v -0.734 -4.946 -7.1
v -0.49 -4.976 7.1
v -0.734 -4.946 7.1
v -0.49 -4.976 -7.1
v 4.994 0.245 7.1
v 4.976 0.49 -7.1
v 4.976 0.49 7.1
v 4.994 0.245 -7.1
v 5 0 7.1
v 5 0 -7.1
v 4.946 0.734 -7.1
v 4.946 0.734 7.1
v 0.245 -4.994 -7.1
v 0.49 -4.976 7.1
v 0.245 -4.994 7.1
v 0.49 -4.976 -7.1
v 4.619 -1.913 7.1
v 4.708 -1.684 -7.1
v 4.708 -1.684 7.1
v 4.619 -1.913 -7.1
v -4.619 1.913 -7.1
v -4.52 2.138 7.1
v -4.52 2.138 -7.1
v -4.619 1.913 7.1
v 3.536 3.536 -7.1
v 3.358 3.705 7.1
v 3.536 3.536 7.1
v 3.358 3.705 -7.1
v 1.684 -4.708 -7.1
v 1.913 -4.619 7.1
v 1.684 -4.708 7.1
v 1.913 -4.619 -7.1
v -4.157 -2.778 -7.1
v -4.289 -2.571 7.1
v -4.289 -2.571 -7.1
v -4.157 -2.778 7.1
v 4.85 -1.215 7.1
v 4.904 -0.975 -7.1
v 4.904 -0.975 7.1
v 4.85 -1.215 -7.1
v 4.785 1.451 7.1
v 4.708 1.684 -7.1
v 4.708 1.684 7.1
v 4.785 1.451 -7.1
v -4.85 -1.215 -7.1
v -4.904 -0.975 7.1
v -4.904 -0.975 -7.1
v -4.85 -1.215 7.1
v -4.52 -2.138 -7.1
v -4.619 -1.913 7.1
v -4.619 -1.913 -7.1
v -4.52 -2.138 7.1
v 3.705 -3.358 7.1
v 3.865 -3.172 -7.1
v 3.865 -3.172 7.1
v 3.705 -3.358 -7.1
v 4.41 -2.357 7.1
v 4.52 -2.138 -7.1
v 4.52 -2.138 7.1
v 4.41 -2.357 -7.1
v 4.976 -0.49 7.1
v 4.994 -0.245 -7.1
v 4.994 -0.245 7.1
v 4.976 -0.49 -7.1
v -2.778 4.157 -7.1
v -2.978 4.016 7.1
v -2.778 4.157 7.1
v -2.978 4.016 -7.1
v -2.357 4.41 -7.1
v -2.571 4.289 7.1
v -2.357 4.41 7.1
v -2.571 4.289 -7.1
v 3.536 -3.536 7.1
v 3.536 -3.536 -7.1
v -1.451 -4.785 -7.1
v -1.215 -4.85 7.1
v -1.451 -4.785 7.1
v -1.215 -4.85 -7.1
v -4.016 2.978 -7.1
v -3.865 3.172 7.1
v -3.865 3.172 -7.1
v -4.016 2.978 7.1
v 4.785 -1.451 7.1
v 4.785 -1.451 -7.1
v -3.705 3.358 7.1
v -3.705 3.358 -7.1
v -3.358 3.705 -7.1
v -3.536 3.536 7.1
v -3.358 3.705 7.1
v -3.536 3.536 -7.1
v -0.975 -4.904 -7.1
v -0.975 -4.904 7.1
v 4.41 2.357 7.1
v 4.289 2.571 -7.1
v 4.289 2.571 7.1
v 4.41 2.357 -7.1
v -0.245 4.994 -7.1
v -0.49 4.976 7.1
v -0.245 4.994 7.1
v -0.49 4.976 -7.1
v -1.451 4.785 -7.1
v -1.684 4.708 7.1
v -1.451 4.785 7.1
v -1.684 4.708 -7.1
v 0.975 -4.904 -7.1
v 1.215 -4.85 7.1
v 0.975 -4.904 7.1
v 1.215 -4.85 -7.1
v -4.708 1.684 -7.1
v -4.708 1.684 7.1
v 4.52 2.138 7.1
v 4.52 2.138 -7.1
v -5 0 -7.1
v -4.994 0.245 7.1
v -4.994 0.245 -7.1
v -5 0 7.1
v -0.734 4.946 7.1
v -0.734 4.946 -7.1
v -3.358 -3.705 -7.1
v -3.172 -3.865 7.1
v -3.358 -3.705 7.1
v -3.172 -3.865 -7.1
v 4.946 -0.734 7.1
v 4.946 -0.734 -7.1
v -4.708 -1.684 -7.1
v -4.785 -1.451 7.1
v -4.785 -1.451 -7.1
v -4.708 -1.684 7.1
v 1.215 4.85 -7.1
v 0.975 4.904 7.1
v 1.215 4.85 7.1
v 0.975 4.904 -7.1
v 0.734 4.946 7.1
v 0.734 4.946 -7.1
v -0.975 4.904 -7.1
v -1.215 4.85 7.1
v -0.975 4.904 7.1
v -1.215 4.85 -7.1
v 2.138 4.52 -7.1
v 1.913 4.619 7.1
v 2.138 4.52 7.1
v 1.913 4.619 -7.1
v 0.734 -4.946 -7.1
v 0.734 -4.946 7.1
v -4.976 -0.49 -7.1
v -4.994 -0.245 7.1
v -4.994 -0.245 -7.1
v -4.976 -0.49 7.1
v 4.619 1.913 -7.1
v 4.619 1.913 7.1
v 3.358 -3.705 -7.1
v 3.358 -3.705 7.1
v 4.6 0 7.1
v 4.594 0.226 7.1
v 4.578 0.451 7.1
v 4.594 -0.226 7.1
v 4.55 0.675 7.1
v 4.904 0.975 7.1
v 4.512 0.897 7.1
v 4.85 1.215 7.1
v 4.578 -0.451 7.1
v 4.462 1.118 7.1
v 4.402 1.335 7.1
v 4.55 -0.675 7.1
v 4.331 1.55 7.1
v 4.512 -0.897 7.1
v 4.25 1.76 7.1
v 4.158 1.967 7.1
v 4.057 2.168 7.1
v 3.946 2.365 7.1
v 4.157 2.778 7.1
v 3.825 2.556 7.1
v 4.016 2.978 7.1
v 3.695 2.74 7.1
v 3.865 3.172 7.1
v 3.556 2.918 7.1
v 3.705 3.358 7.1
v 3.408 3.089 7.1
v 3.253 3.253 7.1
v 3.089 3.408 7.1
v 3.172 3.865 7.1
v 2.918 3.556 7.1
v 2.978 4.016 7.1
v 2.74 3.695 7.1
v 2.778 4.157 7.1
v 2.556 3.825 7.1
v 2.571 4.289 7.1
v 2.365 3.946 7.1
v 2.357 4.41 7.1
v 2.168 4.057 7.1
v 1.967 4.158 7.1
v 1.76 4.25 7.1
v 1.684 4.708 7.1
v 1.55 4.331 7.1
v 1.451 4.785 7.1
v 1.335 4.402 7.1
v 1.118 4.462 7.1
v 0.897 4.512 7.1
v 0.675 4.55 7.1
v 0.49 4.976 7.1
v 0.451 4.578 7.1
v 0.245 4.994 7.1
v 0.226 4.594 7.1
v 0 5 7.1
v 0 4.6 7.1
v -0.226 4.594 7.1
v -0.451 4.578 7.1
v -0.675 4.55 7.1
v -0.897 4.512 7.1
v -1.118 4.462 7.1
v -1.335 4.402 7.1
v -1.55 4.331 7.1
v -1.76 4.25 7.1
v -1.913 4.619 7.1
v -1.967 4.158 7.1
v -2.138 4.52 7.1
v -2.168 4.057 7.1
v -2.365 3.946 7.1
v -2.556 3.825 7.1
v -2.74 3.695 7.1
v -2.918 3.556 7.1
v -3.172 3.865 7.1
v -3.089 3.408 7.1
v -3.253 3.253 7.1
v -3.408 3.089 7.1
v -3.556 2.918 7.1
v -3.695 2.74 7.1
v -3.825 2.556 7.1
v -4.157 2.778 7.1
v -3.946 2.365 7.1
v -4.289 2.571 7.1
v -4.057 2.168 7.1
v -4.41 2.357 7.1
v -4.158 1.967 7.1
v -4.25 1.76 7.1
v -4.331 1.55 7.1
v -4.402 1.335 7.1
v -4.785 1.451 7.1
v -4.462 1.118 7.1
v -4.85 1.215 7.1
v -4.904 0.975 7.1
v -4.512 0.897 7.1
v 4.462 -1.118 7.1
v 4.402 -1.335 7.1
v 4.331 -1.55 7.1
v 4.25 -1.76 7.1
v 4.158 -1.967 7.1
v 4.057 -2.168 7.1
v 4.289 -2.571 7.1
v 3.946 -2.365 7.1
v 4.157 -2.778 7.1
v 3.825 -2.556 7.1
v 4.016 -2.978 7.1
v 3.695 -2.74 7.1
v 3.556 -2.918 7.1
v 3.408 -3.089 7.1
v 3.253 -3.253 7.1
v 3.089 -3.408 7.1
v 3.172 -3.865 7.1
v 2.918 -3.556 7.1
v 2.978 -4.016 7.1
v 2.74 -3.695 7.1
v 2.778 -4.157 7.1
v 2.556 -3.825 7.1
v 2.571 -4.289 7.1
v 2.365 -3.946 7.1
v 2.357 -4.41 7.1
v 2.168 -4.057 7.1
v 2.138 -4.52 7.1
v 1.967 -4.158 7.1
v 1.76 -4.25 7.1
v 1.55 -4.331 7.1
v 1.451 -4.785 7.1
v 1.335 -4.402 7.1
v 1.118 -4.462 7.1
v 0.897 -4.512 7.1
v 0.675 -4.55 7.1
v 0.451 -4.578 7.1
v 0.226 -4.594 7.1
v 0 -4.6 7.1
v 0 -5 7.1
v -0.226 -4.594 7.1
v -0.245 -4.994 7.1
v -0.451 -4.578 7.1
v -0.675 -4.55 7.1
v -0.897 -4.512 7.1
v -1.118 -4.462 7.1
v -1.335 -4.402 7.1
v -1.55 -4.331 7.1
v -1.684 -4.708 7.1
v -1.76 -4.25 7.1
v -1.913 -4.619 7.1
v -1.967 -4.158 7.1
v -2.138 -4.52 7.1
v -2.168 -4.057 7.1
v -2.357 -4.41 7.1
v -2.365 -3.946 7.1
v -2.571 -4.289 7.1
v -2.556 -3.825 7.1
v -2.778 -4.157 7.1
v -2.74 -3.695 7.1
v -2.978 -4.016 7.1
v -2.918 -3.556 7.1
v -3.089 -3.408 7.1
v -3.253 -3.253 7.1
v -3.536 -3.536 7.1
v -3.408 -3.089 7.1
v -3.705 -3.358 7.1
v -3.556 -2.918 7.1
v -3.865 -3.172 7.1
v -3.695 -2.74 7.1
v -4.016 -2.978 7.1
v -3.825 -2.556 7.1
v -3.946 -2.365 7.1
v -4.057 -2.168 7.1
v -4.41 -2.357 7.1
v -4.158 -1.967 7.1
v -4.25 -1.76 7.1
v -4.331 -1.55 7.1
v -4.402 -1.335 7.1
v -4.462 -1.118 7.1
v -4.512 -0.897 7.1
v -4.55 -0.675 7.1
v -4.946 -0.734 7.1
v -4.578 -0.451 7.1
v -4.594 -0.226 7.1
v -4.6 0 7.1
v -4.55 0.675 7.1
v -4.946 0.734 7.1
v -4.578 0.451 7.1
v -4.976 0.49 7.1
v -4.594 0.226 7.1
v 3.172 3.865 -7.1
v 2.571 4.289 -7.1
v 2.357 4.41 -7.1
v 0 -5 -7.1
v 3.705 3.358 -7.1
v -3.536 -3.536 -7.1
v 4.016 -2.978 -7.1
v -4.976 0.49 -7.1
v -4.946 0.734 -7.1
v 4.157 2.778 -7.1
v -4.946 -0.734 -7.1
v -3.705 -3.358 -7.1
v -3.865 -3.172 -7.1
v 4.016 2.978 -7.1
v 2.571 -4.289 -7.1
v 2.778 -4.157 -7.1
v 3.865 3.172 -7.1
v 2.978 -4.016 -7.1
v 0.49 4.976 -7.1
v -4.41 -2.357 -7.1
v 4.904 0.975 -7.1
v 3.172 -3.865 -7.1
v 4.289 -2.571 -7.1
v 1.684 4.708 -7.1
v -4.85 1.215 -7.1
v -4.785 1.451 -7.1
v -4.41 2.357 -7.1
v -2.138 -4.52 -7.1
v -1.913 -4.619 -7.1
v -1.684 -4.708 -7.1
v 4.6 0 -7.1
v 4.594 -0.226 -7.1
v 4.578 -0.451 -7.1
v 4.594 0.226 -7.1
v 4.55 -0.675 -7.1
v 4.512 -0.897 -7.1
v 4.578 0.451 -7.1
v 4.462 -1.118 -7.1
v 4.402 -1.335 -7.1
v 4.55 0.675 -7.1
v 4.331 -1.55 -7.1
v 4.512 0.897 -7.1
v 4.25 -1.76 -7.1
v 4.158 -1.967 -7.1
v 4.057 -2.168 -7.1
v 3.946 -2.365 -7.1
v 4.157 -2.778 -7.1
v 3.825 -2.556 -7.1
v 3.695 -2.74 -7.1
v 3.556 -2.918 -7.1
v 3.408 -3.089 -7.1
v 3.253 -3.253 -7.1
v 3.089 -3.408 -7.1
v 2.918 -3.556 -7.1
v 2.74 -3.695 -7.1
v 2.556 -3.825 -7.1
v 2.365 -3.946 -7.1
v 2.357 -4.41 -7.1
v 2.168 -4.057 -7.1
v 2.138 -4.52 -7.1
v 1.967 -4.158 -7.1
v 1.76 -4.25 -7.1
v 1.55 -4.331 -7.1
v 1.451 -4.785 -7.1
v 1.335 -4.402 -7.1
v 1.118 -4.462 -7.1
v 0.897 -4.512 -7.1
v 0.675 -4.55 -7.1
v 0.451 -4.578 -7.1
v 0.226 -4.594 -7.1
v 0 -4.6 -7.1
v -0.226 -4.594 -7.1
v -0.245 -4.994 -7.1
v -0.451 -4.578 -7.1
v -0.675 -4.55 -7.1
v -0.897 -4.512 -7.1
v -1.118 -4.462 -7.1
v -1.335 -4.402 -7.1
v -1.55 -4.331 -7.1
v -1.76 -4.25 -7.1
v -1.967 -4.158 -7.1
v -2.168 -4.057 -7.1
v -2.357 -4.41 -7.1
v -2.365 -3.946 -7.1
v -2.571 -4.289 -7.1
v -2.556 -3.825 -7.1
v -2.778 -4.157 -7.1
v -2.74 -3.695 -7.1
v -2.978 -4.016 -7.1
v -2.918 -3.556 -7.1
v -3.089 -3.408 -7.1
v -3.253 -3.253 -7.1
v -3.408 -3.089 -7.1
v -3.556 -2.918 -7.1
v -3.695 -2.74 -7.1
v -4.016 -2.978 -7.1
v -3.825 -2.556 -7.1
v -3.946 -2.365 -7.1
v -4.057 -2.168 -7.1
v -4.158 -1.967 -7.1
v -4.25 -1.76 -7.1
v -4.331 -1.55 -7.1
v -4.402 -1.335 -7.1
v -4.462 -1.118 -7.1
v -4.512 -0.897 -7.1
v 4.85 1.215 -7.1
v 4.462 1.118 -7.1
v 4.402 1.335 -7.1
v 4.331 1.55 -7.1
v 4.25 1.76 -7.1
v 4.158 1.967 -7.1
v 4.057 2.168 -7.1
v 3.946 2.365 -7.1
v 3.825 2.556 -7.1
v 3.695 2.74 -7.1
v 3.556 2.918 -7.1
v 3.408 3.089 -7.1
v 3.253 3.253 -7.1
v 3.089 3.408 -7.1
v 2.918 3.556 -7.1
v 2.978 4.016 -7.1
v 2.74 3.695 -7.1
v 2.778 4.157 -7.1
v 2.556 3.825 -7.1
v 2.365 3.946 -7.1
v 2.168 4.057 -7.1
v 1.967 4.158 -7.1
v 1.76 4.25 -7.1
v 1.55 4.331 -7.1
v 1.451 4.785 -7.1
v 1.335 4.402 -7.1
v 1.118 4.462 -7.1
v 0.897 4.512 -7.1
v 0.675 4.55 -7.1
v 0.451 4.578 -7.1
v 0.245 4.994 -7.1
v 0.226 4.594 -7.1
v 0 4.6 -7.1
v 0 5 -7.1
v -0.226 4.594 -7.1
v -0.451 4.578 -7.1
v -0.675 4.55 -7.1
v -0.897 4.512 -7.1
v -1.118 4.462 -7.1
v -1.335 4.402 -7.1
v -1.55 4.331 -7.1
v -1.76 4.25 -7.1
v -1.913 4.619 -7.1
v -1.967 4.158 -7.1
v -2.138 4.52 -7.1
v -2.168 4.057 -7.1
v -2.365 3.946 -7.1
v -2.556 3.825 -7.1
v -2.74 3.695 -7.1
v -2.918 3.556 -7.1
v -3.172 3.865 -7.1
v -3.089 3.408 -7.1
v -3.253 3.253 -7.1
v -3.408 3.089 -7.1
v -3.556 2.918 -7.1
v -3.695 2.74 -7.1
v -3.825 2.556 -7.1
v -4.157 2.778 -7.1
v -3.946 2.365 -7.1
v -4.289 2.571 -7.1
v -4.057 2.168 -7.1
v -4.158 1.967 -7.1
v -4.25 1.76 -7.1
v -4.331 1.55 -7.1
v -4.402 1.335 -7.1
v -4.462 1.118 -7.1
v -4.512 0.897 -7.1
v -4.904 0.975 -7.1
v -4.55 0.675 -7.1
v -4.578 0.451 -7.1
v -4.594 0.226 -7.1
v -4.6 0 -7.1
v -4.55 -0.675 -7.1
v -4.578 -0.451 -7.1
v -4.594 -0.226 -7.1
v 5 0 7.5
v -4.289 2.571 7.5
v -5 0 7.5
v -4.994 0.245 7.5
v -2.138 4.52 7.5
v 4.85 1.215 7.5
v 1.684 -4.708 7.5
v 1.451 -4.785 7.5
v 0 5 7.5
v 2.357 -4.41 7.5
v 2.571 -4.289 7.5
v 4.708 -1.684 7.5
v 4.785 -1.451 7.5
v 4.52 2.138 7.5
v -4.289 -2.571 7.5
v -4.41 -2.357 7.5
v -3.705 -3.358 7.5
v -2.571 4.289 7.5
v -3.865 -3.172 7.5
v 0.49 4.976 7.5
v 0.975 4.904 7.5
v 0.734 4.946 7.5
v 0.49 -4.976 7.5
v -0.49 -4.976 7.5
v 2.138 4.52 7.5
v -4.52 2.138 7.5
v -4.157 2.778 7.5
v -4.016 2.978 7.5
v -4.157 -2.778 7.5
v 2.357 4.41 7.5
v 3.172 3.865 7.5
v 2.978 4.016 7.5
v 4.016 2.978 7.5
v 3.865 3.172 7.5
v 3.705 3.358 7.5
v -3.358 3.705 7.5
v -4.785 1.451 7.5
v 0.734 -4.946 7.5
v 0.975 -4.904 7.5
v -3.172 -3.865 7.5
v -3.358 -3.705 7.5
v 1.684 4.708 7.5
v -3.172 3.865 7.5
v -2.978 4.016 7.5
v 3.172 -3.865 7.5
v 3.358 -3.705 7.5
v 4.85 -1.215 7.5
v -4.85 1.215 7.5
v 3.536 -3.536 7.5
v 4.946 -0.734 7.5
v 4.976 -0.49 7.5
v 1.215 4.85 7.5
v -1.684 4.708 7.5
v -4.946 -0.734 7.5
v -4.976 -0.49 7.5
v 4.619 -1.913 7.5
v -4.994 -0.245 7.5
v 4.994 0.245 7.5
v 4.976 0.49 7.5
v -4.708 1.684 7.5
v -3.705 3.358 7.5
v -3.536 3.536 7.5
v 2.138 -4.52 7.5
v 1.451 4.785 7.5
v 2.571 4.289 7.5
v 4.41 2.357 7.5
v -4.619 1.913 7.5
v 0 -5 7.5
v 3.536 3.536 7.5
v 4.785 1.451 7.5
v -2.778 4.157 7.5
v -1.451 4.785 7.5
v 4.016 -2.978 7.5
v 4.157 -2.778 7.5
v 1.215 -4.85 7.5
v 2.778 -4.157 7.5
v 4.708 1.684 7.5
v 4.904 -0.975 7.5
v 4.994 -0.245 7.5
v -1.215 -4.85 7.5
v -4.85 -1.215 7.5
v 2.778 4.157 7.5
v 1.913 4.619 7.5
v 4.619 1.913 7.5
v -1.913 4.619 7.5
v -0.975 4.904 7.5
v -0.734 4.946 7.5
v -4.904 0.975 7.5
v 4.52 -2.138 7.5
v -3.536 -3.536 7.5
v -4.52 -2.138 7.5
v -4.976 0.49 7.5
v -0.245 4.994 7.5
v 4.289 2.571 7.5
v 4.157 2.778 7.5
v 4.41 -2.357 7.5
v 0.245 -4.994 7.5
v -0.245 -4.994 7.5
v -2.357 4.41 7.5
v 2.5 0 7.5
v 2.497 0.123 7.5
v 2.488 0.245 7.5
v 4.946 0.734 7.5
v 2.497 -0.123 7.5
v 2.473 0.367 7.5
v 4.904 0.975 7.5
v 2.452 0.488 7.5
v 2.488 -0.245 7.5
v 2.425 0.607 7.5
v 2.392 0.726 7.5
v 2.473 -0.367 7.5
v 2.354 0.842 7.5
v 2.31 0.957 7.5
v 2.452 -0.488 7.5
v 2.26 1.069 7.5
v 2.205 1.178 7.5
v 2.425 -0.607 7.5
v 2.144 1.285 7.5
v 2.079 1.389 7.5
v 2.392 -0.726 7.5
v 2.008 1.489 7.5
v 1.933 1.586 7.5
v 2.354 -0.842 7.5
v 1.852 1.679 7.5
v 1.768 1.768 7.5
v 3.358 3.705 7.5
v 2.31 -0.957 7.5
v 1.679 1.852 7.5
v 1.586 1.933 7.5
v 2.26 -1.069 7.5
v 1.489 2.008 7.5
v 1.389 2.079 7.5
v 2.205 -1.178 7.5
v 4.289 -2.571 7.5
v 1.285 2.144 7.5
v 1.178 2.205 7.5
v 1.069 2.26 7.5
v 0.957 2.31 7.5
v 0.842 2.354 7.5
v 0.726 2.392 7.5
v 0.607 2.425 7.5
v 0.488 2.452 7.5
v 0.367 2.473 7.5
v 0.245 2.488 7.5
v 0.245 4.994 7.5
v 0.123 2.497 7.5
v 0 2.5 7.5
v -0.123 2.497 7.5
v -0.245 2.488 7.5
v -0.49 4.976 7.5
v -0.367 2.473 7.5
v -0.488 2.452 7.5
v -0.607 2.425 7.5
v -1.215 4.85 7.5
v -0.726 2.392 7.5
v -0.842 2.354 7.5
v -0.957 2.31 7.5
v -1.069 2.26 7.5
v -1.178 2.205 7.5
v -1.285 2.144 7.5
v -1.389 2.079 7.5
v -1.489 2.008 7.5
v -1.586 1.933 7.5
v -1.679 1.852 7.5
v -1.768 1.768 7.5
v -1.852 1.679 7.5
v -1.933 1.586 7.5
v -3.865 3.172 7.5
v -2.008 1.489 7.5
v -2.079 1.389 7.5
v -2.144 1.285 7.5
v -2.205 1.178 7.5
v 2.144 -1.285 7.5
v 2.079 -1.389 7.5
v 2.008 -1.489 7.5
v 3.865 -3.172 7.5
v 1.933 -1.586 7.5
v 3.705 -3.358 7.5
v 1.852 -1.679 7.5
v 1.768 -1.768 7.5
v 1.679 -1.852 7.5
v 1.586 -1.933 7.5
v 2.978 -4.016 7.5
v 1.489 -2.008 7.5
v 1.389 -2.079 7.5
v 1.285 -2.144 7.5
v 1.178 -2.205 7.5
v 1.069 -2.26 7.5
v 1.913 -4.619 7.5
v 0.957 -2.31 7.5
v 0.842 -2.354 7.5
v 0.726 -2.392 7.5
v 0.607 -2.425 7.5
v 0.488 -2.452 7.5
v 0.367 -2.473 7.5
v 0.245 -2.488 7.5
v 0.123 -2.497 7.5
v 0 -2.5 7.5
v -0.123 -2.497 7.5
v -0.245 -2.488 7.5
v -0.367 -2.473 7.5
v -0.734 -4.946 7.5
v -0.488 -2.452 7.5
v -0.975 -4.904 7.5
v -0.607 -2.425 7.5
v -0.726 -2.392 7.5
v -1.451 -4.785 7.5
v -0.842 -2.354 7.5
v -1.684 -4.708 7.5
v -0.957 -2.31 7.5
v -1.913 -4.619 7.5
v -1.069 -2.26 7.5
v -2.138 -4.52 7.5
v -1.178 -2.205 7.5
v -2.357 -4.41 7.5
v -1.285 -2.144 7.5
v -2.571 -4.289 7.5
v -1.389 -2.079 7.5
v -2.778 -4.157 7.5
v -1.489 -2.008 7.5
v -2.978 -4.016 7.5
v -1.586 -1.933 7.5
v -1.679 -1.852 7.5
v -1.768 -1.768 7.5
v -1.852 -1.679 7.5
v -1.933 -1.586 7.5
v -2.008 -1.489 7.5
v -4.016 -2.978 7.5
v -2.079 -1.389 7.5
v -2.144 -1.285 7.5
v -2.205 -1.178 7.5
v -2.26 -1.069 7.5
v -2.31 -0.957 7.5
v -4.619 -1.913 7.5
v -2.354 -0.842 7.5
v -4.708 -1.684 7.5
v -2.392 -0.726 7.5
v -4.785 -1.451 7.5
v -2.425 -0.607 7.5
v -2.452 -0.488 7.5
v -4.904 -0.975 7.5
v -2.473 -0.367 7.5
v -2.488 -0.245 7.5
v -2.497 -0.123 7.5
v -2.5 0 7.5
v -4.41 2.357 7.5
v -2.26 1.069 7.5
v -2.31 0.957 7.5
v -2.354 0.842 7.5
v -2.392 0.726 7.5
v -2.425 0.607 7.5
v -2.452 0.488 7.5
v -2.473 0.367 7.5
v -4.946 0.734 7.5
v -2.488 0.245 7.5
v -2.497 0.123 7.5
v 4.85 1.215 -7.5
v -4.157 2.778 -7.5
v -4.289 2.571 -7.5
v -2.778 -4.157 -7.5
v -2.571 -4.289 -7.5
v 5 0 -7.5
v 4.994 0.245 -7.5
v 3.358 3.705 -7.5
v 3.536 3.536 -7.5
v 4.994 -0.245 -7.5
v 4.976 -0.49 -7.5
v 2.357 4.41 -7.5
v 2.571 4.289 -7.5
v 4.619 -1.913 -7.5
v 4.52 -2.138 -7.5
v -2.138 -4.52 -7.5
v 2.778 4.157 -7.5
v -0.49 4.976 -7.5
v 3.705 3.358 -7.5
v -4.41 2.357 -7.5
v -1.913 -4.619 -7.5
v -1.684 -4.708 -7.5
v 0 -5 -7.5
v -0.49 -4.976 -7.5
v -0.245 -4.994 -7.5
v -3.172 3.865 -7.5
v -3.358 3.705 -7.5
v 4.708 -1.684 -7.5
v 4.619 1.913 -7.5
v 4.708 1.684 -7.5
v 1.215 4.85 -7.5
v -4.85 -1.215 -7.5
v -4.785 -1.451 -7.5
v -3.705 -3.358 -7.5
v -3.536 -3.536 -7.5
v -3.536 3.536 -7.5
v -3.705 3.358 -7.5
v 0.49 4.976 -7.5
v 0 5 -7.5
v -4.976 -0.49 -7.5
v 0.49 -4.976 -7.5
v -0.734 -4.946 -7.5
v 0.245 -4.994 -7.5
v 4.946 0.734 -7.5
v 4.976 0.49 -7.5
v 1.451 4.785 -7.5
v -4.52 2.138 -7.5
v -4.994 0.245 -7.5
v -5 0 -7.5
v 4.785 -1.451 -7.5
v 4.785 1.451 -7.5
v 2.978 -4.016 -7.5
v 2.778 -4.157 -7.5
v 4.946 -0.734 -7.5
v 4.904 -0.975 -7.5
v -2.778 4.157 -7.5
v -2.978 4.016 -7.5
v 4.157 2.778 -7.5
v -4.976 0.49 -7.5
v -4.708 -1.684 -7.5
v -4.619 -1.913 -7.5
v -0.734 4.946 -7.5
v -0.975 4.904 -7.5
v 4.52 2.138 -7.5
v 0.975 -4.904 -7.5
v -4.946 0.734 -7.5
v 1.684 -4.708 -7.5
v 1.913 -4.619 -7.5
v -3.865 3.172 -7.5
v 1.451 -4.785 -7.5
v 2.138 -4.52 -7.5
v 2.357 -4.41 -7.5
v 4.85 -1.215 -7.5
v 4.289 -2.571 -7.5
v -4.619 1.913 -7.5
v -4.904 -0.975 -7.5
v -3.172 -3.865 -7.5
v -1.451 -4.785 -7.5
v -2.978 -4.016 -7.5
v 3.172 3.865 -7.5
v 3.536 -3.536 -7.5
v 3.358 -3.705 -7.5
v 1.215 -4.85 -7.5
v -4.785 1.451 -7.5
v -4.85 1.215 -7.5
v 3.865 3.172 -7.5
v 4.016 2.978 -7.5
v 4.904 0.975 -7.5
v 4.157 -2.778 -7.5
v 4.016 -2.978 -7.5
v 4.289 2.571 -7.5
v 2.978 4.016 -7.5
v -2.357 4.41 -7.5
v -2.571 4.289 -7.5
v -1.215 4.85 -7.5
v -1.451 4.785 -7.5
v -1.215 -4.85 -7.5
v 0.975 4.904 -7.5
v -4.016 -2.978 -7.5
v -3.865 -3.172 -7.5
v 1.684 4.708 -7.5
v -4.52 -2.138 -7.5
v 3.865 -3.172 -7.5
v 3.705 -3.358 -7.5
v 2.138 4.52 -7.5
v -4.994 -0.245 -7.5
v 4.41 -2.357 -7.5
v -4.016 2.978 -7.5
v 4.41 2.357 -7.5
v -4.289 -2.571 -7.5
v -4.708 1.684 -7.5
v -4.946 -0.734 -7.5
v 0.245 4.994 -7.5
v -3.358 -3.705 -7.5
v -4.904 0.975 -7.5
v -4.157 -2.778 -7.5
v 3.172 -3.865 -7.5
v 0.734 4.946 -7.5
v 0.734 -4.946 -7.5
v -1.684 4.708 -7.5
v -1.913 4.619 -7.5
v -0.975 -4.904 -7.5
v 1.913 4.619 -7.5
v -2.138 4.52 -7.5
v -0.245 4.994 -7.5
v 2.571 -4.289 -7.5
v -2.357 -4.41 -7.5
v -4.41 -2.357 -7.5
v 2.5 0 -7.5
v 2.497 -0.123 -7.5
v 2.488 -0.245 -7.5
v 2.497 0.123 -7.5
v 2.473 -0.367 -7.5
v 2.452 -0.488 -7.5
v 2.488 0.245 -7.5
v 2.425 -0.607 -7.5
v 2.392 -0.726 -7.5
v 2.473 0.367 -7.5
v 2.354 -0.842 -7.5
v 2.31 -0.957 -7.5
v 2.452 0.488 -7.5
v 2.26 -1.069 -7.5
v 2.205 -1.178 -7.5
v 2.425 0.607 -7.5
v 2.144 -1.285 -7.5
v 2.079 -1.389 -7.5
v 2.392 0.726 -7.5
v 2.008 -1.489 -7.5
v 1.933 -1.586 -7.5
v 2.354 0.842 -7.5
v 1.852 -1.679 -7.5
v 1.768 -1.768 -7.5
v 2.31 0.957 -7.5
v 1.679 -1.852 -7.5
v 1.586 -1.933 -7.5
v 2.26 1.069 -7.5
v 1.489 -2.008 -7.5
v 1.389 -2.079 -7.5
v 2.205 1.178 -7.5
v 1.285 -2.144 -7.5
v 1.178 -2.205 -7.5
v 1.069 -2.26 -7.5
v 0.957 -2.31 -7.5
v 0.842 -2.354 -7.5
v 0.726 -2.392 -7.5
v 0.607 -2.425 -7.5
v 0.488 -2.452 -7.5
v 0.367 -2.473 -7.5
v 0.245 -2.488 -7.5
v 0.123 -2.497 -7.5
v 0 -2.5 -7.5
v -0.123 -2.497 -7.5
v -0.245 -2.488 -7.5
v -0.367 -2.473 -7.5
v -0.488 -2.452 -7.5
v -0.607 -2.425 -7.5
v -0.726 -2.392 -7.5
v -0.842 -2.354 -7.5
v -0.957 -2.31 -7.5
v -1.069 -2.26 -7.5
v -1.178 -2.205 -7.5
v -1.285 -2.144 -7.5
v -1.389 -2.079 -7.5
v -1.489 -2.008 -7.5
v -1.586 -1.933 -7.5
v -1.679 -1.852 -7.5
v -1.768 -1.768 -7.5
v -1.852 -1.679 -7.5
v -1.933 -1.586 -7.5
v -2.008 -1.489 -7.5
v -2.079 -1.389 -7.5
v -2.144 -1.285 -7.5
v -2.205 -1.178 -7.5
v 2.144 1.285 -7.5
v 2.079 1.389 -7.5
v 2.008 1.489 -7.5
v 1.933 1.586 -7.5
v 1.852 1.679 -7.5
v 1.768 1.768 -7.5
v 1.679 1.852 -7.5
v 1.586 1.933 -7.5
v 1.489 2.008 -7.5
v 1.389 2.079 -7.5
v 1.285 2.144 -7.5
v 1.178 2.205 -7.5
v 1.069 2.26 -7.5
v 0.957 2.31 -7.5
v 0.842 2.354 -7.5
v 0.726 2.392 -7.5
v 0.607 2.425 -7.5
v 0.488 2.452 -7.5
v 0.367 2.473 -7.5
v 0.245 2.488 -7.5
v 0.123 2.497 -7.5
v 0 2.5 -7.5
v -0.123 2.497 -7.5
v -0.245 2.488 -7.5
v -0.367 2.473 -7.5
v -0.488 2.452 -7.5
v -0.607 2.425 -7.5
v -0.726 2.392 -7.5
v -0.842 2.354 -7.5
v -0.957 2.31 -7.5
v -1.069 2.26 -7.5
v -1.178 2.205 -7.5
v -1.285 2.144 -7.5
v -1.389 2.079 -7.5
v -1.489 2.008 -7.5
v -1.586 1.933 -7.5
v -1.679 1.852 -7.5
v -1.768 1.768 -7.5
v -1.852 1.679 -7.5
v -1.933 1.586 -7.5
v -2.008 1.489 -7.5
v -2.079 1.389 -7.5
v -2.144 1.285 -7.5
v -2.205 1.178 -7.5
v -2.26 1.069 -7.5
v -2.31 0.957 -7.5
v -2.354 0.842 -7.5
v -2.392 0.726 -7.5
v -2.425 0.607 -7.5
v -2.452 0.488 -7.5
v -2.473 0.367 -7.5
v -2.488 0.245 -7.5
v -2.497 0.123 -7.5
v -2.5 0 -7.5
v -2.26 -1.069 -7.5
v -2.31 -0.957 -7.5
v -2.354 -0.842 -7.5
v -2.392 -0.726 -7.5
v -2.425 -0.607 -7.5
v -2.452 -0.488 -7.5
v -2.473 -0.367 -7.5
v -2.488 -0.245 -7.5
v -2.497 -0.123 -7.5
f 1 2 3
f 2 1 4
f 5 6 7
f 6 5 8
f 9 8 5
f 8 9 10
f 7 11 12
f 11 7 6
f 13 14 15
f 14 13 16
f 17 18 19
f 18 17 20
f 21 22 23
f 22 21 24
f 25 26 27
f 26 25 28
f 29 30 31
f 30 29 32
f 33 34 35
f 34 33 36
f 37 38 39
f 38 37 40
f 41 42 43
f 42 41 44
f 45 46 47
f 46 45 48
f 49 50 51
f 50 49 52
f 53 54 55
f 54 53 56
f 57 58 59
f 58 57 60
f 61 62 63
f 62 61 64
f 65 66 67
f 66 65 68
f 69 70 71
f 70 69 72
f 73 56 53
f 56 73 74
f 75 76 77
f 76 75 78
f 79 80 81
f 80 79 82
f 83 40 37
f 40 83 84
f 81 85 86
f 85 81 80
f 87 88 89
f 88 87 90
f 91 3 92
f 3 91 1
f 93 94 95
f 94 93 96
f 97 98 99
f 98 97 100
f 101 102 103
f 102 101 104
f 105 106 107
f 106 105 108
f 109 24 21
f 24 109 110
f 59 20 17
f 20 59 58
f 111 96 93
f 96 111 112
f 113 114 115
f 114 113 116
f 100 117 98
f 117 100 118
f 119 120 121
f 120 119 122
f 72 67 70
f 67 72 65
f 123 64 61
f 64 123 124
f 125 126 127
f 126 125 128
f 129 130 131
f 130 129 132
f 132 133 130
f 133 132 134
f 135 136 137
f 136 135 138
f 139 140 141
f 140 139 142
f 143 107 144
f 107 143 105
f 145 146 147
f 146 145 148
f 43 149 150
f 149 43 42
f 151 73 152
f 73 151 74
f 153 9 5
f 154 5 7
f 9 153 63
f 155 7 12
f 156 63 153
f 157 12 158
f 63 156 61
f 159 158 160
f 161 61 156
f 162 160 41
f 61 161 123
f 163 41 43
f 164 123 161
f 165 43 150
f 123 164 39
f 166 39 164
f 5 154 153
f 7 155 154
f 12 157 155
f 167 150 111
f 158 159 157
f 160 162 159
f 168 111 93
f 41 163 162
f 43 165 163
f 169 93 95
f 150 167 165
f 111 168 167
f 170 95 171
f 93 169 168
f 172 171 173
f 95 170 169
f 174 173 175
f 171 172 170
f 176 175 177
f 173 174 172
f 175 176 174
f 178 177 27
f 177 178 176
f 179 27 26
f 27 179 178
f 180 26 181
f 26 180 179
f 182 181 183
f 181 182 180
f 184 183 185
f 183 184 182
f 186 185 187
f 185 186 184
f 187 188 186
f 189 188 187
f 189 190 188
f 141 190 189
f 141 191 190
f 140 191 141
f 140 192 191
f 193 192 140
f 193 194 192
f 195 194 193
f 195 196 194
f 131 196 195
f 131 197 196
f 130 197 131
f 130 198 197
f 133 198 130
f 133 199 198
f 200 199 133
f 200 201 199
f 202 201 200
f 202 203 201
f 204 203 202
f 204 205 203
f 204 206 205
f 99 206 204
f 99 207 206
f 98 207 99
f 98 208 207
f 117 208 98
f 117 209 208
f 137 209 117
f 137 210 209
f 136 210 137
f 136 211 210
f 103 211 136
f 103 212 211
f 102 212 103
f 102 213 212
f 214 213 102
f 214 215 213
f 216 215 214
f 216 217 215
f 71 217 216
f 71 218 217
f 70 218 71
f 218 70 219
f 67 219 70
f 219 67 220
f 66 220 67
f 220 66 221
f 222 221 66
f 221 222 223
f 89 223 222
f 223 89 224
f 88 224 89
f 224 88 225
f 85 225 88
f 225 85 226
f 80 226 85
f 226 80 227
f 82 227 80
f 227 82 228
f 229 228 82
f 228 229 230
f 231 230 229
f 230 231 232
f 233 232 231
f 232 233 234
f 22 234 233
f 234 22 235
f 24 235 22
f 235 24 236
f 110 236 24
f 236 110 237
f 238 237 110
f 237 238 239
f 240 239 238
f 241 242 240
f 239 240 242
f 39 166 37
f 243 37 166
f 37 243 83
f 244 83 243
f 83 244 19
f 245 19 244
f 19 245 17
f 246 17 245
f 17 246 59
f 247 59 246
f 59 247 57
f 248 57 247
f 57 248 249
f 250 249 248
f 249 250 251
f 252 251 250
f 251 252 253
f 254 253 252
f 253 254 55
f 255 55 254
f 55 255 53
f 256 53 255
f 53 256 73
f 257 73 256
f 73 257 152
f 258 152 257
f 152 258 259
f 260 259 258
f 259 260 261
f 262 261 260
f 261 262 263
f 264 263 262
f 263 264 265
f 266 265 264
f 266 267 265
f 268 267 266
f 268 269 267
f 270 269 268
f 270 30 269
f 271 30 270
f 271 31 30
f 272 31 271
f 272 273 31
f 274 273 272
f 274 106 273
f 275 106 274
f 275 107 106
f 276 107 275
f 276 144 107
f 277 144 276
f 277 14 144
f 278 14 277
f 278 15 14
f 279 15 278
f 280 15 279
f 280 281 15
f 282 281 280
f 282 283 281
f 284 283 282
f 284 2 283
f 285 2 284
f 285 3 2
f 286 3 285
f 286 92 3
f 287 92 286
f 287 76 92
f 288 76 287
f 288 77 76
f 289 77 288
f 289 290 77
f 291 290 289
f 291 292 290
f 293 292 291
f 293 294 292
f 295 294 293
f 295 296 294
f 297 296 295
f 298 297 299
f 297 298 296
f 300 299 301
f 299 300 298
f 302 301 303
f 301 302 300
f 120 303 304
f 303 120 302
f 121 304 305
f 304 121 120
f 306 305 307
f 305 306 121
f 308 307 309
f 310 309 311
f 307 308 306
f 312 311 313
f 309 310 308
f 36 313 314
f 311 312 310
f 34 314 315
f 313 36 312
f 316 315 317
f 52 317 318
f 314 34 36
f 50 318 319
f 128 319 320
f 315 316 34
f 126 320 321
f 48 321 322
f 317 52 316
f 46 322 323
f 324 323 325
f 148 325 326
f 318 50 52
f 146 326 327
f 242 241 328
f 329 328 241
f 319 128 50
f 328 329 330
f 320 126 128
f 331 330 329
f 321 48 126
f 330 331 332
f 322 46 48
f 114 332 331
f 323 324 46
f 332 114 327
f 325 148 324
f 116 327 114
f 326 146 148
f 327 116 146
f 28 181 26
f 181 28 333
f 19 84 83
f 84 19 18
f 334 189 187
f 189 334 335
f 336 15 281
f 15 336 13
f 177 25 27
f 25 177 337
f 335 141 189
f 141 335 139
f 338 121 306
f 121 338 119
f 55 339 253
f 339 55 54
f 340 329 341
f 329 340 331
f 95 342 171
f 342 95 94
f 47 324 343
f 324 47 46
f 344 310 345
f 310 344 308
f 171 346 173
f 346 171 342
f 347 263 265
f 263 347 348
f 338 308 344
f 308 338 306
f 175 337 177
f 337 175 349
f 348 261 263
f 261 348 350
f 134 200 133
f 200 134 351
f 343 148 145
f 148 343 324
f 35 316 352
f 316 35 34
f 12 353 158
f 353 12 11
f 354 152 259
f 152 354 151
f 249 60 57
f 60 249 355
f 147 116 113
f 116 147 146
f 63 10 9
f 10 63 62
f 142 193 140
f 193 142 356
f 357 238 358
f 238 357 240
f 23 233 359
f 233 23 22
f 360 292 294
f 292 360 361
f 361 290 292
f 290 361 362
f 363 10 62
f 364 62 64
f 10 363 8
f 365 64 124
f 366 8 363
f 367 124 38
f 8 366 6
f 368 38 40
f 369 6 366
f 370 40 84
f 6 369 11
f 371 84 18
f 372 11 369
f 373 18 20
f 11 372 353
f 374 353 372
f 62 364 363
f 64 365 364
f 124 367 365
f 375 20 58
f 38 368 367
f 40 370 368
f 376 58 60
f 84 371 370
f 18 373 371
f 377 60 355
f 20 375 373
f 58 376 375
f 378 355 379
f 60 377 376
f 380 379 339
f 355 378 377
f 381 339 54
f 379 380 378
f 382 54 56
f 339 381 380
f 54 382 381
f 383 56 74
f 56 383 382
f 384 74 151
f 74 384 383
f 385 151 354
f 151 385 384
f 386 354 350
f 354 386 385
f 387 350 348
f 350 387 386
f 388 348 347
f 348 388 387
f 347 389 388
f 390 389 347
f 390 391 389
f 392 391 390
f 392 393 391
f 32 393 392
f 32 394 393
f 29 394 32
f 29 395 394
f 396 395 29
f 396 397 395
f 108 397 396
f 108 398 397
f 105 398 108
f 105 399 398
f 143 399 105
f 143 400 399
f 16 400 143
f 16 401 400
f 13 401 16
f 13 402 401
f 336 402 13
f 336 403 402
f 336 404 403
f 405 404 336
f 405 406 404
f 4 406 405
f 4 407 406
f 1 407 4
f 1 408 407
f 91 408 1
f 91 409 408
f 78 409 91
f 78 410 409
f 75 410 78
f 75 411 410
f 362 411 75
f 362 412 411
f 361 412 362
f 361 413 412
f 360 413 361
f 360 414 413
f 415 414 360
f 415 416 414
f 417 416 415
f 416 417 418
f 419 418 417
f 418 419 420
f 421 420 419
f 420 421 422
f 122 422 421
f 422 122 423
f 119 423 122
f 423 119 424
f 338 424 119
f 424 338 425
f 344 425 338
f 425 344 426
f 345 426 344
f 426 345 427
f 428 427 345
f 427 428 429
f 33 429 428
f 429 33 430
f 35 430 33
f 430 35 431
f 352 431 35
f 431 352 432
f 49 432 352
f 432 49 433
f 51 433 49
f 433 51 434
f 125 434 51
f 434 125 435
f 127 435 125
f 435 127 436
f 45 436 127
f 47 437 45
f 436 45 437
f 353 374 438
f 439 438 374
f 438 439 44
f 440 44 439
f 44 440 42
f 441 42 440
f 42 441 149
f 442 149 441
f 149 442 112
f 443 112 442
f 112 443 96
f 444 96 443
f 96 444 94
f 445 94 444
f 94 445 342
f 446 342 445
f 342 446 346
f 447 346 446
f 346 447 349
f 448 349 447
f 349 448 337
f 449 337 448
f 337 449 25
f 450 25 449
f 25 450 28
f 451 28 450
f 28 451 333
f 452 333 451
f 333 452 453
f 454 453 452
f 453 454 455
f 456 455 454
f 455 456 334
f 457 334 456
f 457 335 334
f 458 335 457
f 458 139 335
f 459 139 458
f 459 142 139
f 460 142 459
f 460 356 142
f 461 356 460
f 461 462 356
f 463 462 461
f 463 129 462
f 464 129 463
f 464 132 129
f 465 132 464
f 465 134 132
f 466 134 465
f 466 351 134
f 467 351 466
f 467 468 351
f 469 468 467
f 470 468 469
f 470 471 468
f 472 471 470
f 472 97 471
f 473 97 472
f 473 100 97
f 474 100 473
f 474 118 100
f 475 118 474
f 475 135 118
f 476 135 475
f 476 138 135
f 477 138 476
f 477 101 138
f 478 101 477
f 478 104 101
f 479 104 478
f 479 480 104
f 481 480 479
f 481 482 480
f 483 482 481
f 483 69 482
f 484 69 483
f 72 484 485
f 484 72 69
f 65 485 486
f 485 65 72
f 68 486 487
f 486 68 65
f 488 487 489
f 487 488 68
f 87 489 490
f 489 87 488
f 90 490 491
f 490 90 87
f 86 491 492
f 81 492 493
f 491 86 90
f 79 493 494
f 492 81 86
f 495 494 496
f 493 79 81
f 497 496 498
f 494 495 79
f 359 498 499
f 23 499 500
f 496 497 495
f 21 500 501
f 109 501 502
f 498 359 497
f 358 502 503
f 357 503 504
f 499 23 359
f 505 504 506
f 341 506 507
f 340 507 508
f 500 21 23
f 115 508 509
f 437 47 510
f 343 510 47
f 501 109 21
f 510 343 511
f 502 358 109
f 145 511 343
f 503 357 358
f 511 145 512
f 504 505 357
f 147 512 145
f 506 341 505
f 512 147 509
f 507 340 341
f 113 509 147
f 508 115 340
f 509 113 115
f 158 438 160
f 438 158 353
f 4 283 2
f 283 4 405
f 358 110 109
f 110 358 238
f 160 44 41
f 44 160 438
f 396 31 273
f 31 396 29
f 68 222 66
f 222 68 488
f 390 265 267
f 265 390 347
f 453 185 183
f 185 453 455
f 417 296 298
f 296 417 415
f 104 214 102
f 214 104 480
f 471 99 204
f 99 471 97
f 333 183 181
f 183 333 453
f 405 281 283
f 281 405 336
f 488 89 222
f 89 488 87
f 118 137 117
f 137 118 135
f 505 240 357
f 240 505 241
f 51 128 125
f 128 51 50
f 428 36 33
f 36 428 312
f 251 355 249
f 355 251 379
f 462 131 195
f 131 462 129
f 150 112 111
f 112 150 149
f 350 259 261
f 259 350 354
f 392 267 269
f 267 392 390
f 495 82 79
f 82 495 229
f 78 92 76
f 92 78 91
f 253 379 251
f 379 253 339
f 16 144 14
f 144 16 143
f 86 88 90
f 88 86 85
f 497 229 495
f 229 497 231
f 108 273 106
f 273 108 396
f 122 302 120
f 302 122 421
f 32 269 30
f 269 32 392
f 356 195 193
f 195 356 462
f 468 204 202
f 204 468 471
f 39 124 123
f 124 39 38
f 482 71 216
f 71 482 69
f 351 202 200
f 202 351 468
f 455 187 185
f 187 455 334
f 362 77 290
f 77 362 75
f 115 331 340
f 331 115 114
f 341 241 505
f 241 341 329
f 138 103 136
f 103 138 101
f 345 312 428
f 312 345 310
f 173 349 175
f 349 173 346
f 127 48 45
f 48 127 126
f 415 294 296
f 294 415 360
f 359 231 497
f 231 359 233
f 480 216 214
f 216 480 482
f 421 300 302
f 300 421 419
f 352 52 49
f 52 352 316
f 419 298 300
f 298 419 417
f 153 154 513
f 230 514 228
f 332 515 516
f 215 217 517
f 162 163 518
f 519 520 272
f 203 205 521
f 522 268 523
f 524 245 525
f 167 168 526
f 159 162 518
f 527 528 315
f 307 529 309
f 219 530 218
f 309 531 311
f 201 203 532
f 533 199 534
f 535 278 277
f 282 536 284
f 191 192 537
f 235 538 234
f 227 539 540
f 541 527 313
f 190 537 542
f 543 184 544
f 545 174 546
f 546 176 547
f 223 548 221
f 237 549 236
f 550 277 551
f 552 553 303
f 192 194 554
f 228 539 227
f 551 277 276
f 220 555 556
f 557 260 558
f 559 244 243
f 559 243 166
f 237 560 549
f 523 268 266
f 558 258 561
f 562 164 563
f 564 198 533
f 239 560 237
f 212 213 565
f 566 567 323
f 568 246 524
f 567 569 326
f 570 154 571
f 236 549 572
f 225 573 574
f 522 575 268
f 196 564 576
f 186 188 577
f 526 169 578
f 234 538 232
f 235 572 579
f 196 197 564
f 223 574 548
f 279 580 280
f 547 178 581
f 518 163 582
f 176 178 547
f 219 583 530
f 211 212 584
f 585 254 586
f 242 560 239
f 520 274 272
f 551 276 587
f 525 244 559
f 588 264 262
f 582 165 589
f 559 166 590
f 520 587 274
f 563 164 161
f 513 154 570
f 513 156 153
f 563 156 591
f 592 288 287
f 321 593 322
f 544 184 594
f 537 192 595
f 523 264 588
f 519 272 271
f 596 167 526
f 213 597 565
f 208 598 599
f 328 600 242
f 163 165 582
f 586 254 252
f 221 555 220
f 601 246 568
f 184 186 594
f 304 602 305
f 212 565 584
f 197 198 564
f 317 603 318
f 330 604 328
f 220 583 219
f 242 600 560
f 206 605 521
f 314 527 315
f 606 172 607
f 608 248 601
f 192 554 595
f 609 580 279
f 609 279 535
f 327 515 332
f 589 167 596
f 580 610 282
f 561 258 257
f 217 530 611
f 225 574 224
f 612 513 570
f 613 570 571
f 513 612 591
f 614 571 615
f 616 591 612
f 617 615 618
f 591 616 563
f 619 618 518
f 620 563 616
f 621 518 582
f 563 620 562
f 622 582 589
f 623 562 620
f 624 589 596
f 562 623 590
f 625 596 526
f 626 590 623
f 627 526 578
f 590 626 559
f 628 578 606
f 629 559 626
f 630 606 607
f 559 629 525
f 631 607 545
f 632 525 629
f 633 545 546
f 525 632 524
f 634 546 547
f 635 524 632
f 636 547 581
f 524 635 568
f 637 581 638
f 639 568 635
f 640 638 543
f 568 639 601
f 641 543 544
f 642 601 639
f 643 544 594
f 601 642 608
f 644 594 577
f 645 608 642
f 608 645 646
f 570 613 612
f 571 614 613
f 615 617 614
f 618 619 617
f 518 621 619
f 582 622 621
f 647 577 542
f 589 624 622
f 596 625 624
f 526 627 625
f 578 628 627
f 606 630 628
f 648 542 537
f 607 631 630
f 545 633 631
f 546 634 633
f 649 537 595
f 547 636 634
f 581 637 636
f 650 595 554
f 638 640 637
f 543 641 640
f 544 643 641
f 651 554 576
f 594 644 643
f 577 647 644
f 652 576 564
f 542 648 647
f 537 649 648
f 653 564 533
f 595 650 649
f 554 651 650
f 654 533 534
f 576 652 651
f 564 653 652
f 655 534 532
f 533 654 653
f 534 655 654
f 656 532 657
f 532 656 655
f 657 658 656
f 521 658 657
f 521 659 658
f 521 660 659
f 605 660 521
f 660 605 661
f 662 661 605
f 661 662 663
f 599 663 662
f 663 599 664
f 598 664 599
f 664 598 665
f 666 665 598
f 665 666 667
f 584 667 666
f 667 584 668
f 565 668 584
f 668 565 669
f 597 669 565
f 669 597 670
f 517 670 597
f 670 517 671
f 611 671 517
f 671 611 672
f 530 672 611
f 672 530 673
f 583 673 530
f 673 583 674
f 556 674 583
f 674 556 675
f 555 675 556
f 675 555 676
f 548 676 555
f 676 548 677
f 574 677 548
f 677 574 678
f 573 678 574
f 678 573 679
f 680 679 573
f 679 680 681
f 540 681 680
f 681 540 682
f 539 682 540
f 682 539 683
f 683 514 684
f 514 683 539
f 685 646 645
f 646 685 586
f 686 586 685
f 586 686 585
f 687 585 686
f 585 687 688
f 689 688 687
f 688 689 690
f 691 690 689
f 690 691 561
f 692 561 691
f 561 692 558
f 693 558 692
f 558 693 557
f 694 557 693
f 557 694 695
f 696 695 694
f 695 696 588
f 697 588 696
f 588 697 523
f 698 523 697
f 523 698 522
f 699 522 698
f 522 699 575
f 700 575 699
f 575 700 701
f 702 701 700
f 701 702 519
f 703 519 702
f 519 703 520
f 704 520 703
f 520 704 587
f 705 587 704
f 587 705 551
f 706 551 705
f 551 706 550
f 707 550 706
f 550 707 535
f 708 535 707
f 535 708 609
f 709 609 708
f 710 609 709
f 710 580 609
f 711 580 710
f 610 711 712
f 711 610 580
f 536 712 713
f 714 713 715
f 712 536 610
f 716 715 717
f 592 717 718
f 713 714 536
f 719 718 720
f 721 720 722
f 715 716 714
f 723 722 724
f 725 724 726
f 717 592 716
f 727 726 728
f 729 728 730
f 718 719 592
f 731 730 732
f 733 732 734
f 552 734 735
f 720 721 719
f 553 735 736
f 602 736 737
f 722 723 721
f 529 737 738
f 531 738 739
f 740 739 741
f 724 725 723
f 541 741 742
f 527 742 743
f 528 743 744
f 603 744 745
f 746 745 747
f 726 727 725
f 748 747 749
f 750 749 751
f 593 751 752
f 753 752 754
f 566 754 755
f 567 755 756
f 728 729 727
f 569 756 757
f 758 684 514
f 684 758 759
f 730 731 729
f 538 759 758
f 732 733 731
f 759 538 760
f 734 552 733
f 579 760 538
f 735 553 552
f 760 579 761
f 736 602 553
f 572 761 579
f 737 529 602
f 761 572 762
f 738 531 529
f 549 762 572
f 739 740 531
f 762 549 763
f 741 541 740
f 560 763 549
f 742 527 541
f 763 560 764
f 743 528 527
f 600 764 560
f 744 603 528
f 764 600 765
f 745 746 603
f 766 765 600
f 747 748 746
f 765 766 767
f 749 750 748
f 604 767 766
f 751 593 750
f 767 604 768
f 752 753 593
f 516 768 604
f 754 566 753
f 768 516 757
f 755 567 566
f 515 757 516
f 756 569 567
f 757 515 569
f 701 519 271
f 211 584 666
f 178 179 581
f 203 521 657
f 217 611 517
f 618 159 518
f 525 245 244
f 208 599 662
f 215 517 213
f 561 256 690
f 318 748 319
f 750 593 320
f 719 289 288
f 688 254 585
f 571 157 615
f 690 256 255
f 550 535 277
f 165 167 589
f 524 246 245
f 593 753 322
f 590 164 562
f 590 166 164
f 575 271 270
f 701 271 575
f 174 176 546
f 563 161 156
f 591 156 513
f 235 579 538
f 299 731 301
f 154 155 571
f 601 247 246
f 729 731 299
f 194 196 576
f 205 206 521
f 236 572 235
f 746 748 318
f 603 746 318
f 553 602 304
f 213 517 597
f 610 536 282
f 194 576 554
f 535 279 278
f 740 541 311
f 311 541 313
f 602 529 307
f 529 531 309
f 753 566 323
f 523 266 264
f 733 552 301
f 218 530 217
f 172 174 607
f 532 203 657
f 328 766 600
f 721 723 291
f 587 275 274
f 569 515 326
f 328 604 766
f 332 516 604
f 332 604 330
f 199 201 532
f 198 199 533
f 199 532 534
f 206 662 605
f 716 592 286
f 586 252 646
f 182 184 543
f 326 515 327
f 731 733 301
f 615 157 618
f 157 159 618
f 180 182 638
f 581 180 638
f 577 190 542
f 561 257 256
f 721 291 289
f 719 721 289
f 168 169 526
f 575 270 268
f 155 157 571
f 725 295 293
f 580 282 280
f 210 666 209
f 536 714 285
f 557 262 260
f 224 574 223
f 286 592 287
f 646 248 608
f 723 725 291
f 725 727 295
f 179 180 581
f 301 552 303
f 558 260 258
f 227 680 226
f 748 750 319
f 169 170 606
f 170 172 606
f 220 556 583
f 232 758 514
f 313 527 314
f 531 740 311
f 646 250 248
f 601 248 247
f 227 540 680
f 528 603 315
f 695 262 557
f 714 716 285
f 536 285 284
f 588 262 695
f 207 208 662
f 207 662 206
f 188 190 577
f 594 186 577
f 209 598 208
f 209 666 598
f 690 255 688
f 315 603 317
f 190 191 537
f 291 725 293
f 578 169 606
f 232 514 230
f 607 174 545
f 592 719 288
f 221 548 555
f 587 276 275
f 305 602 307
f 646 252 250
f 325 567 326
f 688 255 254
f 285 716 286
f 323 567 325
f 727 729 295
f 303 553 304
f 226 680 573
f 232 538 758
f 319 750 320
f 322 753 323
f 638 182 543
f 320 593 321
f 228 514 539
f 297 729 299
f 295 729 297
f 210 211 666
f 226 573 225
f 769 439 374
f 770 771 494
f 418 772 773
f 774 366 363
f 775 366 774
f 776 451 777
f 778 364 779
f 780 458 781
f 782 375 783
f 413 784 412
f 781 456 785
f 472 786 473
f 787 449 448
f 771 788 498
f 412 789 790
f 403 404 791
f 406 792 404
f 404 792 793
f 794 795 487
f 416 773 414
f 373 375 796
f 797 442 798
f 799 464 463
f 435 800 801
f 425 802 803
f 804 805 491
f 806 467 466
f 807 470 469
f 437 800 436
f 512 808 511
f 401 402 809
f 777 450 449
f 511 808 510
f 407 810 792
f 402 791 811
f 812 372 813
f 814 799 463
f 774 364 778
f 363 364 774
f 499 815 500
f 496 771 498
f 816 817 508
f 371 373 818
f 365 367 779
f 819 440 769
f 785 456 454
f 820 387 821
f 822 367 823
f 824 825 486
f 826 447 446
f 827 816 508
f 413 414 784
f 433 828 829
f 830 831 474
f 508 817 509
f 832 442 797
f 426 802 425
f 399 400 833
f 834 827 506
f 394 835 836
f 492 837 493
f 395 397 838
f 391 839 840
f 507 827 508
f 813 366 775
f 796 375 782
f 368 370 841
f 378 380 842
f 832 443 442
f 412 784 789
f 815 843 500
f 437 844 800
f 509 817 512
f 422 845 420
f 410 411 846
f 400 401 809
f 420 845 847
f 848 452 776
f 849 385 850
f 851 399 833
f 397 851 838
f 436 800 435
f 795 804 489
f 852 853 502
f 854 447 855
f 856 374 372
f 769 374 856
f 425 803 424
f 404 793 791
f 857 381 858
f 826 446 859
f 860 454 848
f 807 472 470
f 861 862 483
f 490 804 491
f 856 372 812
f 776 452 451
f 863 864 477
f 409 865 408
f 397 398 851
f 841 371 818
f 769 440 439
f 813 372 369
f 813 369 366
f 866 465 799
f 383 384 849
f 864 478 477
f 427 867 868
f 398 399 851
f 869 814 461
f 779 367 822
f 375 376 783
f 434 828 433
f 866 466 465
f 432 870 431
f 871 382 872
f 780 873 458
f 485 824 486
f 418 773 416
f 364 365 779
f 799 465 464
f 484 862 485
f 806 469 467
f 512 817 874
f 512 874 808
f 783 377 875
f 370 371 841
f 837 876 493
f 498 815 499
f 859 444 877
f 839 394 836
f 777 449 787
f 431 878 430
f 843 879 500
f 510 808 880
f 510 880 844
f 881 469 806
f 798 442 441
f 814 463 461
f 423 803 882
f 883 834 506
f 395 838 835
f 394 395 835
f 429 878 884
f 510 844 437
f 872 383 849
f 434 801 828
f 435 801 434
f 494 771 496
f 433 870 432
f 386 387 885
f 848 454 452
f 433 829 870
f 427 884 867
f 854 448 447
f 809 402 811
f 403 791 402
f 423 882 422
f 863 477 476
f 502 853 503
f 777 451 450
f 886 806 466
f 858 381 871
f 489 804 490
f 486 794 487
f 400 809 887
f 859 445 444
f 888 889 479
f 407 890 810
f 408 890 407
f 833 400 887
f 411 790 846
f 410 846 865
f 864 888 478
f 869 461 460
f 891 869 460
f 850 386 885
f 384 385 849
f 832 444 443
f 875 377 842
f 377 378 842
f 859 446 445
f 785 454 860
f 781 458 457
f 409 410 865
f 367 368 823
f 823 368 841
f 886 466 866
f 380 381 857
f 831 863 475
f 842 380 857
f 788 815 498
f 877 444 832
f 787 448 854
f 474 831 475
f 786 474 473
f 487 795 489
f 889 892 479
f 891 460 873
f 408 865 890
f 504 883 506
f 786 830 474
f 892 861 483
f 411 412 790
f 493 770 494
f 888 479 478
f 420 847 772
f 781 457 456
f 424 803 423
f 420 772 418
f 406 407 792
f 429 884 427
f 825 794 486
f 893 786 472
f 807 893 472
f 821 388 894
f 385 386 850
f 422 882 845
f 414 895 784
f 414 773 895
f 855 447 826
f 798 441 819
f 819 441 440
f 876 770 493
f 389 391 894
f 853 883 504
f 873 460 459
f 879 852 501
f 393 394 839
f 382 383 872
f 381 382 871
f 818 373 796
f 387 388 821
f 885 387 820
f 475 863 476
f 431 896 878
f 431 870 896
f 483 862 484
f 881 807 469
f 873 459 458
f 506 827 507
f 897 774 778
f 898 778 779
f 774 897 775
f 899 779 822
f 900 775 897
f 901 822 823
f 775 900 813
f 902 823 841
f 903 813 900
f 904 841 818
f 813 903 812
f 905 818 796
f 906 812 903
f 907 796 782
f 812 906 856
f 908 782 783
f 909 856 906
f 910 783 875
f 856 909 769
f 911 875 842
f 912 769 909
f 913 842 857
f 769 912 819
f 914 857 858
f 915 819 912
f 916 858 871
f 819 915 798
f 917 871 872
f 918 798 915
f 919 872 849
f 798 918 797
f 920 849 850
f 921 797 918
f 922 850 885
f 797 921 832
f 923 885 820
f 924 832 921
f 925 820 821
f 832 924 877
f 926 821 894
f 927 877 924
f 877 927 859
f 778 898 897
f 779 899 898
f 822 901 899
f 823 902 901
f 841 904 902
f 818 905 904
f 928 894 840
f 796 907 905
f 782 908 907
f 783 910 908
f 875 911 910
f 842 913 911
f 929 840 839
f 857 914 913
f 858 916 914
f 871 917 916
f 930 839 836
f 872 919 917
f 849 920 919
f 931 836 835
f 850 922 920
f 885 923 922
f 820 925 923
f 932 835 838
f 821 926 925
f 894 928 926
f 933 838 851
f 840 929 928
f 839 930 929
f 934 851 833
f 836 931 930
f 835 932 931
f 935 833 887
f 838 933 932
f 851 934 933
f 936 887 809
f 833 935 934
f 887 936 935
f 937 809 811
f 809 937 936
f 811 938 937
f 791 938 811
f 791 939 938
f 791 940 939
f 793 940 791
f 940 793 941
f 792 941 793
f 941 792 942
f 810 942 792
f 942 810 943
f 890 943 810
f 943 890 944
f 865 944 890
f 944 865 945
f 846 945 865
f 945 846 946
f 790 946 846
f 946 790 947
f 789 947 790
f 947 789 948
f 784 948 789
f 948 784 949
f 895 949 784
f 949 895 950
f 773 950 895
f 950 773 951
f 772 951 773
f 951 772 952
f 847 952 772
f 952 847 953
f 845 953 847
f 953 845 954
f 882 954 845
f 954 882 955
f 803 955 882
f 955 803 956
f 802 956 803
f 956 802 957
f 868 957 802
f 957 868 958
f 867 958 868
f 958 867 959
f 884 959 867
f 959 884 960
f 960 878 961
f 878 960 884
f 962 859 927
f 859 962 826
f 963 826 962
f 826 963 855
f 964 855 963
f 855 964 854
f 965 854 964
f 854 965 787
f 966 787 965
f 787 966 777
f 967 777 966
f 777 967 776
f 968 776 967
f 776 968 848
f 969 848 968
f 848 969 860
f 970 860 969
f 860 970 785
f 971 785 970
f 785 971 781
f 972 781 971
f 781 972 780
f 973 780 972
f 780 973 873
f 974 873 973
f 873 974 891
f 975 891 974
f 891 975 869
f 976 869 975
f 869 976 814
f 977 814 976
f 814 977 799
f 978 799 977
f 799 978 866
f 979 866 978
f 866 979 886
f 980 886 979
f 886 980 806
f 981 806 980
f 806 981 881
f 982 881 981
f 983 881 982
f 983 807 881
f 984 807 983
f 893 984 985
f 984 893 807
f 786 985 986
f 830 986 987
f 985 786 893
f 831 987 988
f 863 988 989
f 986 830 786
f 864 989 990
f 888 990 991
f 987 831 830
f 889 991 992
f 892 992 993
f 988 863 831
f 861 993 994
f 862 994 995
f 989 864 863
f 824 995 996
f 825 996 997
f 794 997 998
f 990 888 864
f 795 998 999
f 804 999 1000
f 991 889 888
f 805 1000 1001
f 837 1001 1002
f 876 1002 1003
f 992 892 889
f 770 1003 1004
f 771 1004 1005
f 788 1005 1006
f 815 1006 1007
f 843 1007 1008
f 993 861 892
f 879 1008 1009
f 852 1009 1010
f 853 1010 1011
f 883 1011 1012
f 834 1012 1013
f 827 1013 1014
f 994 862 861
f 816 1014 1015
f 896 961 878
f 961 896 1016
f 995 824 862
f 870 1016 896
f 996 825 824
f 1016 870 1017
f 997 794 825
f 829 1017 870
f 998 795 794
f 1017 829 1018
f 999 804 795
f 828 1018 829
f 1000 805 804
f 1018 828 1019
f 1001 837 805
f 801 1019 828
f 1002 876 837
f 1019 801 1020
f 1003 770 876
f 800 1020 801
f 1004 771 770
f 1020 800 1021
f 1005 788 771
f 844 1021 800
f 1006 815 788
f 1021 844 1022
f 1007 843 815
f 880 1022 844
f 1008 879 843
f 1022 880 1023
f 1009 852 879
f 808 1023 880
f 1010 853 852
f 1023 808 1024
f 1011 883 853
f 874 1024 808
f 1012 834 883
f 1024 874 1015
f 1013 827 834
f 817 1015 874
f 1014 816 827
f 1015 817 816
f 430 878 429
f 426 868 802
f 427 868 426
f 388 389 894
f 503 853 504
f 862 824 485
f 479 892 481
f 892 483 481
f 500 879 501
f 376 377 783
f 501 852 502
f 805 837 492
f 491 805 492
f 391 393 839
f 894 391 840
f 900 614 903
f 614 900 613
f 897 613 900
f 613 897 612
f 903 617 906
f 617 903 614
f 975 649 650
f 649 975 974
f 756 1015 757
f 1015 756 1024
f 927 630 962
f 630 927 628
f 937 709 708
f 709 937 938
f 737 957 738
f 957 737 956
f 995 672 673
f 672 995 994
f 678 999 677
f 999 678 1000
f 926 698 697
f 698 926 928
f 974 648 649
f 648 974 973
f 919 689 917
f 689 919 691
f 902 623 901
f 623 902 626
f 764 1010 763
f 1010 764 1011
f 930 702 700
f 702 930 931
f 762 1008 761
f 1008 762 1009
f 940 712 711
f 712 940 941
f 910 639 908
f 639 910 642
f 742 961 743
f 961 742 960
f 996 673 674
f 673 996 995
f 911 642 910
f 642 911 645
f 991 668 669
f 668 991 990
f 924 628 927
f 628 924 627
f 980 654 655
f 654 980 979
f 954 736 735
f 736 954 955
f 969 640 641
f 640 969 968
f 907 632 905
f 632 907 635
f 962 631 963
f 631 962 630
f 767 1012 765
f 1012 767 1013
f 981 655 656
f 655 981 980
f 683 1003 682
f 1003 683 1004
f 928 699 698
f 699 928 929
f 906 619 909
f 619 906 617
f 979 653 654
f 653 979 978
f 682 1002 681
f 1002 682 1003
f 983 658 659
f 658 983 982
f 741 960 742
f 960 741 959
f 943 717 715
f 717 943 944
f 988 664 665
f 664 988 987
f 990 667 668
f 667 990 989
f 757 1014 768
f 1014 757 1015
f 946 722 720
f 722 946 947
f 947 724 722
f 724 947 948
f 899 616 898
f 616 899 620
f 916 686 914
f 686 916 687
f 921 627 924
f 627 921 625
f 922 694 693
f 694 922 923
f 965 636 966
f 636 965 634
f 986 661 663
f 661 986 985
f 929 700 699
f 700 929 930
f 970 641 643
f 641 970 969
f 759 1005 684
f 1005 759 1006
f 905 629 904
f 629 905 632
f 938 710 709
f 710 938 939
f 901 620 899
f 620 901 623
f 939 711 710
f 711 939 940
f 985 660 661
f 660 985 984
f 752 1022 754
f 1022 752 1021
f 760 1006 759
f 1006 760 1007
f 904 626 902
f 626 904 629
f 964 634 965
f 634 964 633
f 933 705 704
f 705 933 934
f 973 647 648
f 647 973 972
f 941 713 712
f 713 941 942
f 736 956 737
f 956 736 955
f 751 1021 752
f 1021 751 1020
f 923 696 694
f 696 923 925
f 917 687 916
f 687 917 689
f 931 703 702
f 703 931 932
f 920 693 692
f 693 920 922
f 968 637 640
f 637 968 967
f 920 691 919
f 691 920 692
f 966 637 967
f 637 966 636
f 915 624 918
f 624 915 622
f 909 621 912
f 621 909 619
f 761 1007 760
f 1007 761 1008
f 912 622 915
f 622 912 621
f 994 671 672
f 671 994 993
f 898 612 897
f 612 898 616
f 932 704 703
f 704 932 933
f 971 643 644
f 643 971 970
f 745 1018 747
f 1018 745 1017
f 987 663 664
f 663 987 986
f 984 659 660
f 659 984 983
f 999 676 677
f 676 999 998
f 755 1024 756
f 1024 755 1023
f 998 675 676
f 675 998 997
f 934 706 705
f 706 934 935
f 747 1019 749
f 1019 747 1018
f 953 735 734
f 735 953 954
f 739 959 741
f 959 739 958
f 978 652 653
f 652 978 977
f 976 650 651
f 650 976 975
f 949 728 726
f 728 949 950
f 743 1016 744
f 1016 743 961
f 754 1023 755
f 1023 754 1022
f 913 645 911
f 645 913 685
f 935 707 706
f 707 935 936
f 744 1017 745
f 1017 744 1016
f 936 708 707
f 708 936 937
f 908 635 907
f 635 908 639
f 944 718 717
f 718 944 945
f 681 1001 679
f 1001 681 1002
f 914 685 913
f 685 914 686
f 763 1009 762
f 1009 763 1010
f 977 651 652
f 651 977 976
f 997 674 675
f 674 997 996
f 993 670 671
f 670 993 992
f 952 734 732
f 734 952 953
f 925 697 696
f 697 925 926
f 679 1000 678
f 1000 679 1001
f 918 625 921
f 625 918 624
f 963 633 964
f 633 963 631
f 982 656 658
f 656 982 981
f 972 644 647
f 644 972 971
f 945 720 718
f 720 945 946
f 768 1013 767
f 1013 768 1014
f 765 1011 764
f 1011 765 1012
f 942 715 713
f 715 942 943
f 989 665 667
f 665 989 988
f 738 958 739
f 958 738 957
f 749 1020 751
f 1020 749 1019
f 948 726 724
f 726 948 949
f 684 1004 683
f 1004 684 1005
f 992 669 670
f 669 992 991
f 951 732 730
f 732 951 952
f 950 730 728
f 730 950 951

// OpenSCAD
// Linear bearing (single connected solid) — 5mm bore, 10mm OD, 15mm length

$fn = 128;

// Requested dimensions
bore_diameter_mm  = 5.0;
outer_diameter_mm = 10.0;
length_mm         = 15.0;

// Optional cosmetic features (kept subtle and fully connected)
chamfer_mm = 0.4;   // small end chamfer
overlap_mm = 0.02;  // tiny overlap to avoid coincident faces

module linear_bearing_5x10x15() {
    difference() {
        // Outer body with slight end chamfers (still a single solid)
        union() {
            // Main cylinder
            cylinder(d=outer_diameter_mm, h=length_mm - 2*chamfer_mm, center=true);

            // End chamfers as short frustums
            translate([0, 0,  (length_mm/2 - chamfer_mm/2)])
                cylinder(d1=outer_diameter_mm - 2*chamfer_mm, d2=outer_diameter_mm, h=chamfer_mm, center=true);

            translate([0, 0, -(length_mm/2 - chamfer_mm/2)])
                cylinder(d1=outer_diameter_mm, d2=outer_diameter_mm - 2*chamfer_mm, h=chamfer_mm, center=true);
        }

        // Through bore (exact 5.0mm)
        cylinder(d=bore_diameter_mm, h=length_mm + 2*overlap_mm, center=true);
    }
}

linear_bearing_5x10x15();
